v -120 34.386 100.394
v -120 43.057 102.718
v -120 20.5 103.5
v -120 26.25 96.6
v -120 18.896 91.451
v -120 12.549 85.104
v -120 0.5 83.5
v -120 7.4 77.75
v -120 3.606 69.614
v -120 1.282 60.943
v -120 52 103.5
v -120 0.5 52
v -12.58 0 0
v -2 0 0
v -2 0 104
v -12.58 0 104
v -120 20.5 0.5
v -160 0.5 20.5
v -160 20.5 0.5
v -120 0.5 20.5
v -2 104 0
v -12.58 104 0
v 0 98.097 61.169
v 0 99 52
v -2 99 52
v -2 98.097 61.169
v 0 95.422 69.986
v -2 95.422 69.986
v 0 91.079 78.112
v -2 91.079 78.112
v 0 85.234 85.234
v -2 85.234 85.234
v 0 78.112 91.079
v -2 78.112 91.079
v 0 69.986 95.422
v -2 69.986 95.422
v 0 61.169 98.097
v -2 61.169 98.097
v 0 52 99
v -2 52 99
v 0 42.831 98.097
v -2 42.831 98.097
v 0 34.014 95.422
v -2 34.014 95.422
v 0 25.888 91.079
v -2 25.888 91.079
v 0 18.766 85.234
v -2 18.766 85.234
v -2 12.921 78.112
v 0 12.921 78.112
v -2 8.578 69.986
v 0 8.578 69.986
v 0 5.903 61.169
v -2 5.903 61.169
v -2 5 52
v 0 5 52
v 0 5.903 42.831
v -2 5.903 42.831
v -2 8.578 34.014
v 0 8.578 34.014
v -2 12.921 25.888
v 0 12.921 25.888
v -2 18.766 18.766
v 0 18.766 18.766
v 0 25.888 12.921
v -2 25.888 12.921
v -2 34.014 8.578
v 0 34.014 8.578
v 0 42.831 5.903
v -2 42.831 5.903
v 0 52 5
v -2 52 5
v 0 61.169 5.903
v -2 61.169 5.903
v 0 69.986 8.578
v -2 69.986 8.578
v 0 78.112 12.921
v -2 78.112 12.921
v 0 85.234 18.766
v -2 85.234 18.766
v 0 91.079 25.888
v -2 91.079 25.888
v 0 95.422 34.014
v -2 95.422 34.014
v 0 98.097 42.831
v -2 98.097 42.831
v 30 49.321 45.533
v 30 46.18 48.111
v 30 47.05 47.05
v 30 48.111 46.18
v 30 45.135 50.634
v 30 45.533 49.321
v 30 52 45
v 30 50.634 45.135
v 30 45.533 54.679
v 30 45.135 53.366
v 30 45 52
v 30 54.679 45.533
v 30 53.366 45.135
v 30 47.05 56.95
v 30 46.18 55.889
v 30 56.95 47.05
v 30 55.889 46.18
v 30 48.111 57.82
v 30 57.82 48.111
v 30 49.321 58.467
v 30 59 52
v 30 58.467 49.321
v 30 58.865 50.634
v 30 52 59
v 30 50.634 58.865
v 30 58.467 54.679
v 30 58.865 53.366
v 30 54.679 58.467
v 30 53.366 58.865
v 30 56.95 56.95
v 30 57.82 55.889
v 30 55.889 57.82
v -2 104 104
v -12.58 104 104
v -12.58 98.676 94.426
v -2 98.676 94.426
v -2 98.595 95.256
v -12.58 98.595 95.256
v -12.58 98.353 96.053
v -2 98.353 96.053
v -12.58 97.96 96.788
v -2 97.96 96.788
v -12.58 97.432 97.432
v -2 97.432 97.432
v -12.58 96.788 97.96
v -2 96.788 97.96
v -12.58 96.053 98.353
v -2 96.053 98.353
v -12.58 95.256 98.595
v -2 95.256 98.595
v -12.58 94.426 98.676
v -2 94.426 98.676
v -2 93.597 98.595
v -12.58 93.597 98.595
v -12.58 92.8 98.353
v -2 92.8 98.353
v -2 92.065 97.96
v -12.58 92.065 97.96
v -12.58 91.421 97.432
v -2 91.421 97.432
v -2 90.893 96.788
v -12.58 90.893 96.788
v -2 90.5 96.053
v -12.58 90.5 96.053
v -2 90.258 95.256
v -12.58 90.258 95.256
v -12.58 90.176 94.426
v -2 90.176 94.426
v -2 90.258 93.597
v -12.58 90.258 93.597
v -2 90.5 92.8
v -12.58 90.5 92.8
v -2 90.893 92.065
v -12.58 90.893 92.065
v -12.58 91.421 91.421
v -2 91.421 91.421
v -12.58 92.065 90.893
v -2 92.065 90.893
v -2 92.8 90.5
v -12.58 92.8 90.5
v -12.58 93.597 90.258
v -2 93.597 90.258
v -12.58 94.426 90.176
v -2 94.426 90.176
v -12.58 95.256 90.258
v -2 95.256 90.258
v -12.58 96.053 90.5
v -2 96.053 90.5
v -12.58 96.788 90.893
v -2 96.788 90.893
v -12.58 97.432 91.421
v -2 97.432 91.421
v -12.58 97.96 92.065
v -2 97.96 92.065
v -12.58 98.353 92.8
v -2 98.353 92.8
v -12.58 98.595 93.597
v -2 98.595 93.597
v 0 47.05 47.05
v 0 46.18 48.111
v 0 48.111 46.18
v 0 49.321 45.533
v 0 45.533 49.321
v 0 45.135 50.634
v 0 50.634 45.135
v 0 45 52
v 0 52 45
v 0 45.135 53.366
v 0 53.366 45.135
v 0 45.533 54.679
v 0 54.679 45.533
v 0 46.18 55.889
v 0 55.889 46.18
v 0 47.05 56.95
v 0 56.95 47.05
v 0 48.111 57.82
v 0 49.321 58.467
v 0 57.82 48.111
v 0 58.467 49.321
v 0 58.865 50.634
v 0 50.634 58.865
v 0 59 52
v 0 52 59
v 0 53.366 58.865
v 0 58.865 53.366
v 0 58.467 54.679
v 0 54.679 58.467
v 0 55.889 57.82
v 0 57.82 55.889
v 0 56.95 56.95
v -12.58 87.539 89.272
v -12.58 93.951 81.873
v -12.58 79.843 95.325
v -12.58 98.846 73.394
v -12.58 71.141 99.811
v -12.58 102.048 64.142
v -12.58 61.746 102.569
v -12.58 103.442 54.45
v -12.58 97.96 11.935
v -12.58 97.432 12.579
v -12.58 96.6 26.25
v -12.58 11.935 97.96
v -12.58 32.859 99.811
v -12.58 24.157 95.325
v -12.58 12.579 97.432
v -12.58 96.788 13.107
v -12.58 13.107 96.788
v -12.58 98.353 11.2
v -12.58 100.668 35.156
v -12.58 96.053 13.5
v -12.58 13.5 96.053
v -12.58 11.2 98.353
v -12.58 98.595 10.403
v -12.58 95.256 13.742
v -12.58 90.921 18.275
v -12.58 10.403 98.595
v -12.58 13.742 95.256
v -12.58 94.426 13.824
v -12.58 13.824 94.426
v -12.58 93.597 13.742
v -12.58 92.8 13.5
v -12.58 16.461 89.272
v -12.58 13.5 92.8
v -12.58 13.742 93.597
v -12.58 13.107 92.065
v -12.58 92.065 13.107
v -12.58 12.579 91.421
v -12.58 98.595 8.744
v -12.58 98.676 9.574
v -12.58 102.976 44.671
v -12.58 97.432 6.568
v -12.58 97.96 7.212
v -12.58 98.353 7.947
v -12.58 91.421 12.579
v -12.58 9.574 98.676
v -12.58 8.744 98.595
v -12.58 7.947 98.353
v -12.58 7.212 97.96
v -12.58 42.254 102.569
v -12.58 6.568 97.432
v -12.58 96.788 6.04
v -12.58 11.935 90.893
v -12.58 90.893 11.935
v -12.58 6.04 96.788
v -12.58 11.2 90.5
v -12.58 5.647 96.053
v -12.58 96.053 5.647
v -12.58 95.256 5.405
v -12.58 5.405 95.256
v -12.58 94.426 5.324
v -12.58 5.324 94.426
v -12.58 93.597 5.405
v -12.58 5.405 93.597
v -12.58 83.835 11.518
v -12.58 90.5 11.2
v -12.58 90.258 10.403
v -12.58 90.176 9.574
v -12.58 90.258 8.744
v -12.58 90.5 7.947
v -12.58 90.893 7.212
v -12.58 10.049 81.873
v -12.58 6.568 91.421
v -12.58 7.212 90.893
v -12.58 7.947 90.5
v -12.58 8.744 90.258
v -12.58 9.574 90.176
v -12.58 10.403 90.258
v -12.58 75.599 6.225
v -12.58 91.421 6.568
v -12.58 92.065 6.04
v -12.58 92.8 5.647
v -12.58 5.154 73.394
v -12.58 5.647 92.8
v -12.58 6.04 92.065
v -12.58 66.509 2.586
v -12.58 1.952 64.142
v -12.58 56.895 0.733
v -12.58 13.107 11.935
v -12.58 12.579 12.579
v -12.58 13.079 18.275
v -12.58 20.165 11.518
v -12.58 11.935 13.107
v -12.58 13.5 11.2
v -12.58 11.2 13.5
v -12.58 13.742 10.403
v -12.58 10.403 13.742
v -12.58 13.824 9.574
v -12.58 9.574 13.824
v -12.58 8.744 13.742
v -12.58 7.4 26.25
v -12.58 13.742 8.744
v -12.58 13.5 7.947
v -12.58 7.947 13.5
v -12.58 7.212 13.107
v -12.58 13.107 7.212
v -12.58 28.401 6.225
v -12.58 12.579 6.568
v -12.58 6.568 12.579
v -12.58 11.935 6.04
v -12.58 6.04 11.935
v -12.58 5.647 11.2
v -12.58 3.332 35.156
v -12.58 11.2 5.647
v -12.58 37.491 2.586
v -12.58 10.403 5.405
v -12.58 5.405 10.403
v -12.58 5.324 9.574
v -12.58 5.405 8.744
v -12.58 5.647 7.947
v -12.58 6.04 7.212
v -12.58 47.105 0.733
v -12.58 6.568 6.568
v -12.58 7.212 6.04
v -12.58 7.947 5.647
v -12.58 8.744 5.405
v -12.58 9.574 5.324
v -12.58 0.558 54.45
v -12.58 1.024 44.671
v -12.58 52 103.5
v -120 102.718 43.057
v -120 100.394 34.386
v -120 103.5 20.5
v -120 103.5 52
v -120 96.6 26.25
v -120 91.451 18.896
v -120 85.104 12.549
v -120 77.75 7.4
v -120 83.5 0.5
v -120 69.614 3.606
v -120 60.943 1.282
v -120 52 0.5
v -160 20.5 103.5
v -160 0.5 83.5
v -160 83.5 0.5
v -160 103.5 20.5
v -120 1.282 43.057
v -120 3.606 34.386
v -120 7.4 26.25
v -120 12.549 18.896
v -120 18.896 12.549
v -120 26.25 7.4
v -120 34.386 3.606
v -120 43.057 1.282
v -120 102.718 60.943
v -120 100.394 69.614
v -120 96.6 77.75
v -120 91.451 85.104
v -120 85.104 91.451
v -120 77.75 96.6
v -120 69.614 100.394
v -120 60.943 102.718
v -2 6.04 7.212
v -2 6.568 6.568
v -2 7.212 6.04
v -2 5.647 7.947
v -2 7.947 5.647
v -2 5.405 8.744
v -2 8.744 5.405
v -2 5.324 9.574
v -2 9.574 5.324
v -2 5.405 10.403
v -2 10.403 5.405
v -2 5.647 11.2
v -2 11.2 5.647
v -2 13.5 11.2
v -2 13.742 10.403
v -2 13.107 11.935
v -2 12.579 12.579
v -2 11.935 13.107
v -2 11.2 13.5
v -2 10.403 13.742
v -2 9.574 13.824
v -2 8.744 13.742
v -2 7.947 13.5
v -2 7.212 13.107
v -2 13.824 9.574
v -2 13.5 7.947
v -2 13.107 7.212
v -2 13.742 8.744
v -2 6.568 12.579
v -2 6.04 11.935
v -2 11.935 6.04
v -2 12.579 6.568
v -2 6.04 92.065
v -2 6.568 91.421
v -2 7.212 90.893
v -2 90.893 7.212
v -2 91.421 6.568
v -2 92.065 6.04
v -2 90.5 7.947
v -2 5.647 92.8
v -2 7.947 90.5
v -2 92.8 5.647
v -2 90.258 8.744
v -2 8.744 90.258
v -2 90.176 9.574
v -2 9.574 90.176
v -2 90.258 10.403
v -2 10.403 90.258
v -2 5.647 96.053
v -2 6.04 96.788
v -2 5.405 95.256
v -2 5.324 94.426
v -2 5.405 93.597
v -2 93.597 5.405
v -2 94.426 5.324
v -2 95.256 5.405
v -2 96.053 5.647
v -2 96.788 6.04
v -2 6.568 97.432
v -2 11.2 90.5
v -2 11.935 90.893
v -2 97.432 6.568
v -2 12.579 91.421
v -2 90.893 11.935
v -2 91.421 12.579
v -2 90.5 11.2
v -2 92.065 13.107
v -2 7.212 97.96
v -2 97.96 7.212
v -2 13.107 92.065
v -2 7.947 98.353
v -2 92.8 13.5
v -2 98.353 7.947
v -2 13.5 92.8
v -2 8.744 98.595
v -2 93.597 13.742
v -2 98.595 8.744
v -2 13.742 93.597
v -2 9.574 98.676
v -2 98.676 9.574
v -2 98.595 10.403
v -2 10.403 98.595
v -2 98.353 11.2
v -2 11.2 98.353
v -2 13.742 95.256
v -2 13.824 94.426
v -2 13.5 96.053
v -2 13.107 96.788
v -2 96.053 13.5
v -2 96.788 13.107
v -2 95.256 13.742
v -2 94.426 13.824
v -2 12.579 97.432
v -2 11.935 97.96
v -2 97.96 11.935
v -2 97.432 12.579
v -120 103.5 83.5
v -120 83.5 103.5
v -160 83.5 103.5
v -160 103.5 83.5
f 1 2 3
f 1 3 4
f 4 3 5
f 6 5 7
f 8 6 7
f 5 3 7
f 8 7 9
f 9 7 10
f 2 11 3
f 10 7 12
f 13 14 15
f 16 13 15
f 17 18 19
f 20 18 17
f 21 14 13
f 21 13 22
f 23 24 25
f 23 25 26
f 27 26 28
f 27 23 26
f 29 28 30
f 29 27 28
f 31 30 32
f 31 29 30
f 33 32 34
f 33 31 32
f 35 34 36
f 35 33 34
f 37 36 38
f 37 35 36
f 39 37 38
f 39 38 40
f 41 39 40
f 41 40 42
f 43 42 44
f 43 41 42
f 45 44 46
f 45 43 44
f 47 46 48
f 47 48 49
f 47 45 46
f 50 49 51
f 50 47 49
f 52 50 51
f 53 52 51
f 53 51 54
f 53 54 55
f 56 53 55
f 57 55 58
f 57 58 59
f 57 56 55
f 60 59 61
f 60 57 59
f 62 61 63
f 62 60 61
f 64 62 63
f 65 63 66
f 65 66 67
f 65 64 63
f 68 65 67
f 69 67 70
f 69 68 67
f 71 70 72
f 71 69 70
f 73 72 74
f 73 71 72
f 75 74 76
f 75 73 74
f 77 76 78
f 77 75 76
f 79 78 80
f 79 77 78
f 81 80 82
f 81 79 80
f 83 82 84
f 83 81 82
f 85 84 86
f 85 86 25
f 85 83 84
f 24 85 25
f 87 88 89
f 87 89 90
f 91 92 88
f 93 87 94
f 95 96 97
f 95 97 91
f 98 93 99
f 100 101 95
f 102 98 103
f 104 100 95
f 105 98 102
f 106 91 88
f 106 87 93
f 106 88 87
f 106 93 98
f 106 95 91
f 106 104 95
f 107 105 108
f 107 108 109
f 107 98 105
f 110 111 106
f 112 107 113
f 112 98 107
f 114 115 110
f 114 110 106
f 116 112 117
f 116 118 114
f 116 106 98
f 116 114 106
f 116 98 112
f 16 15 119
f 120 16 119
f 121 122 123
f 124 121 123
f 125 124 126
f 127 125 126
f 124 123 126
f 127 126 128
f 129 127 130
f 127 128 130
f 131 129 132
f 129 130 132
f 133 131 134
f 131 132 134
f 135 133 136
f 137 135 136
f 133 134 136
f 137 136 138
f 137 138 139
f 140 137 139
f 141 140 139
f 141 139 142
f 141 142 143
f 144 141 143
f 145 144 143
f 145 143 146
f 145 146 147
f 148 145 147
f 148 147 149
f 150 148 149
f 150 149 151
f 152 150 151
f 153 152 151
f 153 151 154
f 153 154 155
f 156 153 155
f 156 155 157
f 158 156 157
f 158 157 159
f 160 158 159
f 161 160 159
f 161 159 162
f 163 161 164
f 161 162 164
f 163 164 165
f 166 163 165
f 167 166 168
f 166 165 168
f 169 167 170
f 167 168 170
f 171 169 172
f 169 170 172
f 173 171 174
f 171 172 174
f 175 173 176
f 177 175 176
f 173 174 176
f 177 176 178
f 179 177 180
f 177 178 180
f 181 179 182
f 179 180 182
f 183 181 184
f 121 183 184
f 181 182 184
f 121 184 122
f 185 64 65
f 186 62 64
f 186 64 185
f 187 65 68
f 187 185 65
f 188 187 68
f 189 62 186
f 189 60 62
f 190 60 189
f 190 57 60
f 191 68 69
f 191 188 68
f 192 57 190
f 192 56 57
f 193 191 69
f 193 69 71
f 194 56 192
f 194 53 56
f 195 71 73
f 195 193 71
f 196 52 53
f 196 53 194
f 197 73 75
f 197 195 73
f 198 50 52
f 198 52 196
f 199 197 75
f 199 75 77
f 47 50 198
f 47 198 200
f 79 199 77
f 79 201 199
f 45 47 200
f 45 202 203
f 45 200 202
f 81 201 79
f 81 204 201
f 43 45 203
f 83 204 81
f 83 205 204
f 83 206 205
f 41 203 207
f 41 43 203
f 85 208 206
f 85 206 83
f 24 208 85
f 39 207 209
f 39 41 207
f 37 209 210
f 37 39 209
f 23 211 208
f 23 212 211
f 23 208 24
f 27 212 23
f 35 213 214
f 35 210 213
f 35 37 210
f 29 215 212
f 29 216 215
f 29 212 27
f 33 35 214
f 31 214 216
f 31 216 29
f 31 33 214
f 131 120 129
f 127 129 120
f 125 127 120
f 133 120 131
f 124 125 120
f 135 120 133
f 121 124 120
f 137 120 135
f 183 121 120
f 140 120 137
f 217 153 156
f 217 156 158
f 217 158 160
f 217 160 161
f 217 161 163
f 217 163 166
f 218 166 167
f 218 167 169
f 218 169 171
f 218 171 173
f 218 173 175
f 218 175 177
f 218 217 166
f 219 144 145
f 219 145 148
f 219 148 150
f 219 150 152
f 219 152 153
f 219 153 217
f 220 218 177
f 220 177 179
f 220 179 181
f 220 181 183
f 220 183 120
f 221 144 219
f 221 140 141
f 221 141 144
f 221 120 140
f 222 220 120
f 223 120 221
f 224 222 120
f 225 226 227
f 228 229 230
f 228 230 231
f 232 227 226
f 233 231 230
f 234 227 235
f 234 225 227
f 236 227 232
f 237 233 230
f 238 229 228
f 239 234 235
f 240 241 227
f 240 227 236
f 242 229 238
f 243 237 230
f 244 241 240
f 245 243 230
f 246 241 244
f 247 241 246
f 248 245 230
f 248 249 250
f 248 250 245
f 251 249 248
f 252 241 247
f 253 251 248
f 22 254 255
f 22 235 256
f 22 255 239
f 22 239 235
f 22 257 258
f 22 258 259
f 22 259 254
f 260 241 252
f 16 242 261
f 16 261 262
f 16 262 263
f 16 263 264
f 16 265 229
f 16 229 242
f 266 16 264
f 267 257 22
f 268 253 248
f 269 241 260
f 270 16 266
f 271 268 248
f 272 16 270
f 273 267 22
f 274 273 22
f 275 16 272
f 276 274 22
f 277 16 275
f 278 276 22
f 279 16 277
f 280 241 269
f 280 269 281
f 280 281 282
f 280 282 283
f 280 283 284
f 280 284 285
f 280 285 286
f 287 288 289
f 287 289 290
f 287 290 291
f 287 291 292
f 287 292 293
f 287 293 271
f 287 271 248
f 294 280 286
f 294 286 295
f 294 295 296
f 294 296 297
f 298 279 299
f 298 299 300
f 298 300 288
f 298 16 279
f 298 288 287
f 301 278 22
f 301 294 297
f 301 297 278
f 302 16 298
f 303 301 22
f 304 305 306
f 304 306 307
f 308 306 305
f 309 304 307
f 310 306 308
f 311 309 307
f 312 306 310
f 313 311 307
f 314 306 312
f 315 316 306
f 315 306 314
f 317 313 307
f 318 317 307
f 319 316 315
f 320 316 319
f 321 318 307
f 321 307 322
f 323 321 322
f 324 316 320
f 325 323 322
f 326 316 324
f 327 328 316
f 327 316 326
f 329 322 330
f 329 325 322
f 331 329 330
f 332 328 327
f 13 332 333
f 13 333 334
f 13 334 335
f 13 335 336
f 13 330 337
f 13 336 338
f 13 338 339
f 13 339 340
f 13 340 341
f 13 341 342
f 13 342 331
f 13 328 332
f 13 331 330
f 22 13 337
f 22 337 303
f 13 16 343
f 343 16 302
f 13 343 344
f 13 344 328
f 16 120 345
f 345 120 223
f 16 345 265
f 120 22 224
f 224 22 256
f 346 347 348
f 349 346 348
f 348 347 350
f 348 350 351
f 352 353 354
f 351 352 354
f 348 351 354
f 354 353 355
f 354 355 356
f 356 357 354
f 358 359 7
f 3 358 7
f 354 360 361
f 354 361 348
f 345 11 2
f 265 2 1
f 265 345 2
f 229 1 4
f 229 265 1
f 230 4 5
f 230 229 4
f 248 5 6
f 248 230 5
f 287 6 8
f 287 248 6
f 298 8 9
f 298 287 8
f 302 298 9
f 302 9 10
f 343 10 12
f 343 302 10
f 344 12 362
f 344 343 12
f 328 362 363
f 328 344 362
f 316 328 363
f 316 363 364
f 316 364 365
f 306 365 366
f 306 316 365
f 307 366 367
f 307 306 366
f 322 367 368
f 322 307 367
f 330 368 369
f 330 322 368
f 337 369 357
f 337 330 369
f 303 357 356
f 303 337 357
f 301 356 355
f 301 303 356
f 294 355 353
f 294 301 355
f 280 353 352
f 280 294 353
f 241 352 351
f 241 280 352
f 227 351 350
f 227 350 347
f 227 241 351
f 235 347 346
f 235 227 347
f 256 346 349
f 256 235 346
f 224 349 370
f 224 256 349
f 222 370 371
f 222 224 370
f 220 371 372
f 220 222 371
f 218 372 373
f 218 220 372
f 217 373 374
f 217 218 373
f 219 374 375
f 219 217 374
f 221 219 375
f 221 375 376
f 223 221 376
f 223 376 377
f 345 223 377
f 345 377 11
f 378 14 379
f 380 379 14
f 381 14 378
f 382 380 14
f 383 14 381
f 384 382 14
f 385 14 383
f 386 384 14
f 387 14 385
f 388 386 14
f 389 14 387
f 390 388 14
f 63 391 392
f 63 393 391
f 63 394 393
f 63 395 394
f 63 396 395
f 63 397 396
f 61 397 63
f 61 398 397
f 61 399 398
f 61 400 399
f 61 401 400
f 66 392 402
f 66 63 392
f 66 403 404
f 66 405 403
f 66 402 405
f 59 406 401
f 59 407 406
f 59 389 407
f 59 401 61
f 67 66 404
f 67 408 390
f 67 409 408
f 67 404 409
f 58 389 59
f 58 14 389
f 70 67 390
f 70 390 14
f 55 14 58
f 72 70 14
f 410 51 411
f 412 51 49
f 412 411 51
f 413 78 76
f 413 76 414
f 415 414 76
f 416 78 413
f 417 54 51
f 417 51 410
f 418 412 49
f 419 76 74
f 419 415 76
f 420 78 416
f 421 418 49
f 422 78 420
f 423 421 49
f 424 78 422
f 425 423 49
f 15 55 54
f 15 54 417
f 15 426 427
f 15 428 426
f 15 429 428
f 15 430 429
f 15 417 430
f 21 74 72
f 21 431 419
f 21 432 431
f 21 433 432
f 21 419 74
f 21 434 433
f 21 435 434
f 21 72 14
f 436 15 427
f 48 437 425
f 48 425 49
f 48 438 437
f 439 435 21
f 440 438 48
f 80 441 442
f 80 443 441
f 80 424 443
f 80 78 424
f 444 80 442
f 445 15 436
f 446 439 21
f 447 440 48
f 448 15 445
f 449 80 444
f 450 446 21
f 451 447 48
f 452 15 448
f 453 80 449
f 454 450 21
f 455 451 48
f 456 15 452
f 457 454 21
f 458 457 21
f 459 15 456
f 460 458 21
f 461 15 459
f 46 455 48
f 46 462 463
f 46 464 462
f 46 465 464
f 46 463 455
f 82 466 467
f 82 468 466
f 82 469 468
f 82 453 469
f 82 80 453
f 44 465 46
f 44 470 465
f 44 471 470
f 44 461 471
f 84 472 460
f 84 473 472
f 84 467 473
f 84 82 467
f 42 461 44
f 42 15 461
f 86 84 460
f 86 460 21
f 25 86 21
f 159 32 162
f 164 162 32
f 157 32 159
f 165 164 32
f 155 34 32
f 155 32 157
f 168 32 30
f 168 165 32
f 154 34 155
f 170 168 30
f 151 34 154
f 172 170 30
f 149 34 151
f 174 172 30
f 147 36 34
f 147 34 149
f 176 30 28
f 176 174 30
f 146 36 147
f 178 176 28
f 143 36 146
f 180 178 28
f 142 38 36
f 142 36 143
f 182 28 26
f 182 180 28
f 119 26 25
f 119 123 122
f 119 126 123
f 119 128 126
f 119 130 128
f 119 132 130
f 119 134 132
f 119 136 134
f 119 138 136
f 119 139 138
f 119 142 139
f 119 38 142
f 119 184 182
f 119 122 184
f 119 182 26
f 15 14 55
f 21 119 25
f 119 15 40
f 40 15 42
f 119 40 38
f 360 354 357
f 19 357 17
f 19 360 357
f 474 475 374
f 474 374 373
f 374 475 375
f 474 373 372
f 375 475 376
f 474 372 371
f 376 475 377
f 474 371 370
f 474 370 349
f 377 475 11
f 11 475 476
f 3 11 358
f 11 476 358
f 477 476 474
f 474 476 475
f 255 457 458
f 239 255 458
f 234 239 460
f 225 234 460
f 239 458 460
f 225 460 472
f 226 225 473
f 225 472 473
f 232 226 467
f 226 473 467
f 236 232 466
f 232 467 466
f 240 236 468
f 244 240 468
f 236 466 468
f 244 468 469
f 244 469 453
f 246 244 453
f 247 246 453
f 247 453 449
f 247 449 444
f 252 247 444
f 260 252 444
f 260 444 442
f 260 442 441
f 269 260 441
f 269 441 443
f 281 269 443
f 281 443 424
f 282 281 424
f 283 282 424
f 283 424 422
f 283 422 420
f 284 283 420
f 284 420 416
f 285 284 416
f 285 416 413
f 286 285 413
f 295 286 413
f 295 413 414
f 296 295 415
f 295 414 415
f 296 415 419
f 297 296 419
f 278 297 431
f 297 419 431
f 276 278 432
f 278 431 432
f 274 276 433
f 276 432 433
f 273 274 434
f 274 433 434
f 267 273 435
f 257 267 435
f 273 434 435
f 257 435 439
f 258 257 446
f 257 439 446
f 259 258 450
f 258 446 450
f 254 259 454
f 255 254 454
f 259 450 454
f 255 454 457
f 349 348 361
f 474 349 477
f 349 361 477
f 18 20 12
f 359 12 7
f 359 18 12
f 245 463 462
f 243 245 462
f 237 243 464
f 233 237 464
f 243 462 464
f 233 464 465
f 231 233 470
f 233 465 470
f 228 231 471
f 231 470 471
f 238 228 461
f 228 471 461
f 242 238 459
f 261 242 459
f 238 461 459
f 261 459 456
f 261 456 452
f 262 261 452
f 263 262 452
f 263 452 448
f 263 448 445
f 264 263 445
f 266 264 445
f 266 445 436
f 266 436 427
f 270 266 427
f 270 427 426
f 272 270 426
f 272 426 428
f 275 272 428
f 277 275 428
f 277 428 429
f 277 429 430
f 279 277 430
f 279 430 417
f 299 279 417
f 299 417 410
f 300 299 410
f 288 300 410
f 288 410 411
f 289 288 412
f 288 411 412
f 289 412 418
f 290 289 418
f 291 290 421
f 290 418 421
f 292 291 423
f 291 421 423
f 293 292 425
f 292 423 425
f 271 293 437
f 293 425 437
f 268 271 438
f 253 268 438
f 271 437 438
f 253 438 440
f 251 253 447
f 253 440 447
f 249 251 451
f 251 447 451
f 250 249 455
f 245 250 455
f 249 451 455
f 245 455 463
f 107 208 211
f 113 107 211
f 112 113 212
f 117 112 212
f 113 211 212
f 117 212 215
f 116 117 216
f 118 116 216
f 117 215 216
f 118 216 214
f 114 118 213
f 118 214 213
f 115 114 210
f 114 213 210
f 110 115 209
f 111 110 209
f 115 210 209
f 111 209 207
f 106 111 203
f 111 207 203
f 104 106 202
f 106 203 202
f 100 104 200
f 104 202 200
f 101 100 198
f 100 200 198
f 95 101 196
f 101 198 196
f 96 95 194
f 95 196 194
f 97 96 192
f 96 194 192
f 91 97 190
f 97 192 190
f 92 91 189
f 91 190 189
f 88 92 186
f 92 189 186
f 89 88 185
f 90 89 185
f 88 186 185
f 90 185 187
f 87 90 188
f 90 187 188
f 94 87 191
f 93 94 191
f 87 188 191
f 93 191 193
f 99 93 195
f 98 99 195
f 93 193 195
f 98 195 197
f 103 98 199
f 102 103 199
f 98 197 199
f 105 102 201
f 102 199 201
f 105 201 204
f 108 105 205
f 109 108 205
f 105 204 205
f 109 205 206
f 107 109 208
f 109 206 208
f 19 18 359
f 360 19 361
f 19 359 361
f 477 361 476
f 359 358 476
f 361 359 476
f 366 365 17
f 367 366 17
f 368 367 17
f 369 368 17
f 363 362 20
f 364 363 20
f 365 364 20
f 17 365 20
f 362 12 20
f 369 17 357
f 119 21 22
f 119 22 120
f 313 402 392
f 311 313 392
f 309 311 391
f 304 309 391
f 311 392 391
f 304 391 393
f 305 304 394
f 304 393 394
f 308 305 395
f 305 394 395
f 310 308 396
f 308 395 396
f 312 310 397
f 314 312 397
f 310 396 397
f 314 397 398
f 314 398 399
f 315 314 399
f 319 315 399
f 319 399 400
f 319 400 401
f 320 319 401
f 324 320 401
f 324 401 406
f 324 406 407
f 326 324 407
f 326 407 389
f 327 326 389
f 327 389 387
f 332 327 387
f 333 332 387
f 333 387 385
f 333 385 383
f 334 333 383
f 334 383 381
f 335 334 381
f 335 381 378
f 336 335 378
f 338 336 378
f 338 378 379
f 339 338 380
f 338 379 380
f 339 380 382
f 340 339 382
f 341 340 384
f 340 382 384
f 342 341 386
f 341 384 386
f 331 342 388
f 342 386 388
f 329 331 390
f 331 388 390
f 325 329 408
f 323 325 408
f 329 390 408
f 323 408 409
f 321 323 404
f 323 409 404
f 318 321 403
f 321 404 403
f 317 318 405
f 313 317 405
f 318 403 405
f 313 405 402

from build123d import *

# Parameters (mm, degrees)
F0_W      = 104
F0_H      = 104
F1_DEPTH  = 160
F3_W      = 107.42
F3_H      = 40
F5_W      = 104
F5_H      = 104
F5_W_2    = 103
F5_H_2    = 103
F6_DEPTH  = 40
F7_SIZE   = 20
F8_R      = 4.25
F9_DEPTH  = 25
F10_R     = 7
F11_DEPTH = 30
F12_W     = 104
F12_H     = 104
F12_R     = 4.25
F12_R_2   = 47
F13_DEPTH = 2


with BuildPart() as f1:
    # F0 (on Right) → F1 (new body)
    with BuildSketch(Plane.YZ):
        with Locations((52, 52)):
            Rectangle(F0_W, F0_H)
    extrude(amount=-F1_DEPTH)

    # F3 (on offset) → F4 (revolve, cut)
    with BuildSketch(Plane.XZ.offset(-52)):
        with Locations((-66.29, 123.5)):
            Rectangle(F3_W, F3_H)
    revolve(axis=Axis((-69.2846309394, 52, 52), (1, 0, 0)), mode=Mode.SUBTRACT)

    # F5 (on face) → F6 (cut)
    with BuildSketch(Plane(origin=(-160, 0, 0), x_dir=(0, -1, 0), z_dir=(-1, 0, 0))):
        with Locations((-52, 52)):
            Rectangle(F5_W, F5_H)
        with Locations((-52, 52)):
            Rectangle(F5_W_2, F5_H_2, mode=Mode.SUBTRACT)
    extrude(amount=-F6_DEPTH, mode=Mode.SUBTRACT)

    # F7
    f7_edges = [f1.edges().sort_by_distance(p)[0] for p in [
        (-140, 0.5, 103.5),
        (-140, 103.5, 103.5),
        (-140, 103.5, 0.5),
        (-140, 0.5, 0.5),
    ]]
    chamfer(f7_edges, length=F7_SIZE)

    # F8 (on face) → F9 (cut)
    with BuildSketch(Plane.YZ):
        with Locations((94.4264068712, 94.4264068712)):
            Circle(F8_R)
        with Locations((94.4264068712, 9.5735931288)):
            Circle(F8_R)
        with Locations((9.5735931288, 94.4264068712)):
            Circle(F8_R)
        with Locations((9.5735931288, 9.5735931288)):
            Circle(F8_R)
    extrude(amount=-F9_DEPTH, mode=Mode.SUBTRACT)

    # F10 (on face) → F11 (join)
    with BuildSketch(Plane.YZ):
        with Locations((52, 52)):
            Circle(F10_R)
    extrude(amount=F11_DEPTH)

    # F12 (on face) → F13 (cut)
    with BuildSketch(Plane.YZ):
        with Locations((52, 52)):
            Rectangle(F12_W, F12_H)
        with Locations((9.5735931288, 9.5735931288)):
            Circle(F12_R, mode=Mode.SUBTRACT)
        with Locations((94.4264068712, 9.5735931288)):
            Circle(F12_R, mode=Mode.SUBTRACT)
        with Locations((9.5735931288, 94.4264068712)):
            Circle(F12_R, mode=Mode.SUBTRACT)
        with Locations((52, 52)):
            Circle(F12_R_2, mode=Mode.SUBTRACT)
        with Locations((94.4264068712, 94.4264068712)):
            Circle(F12_R, mode=Mode.SUBTRACT)
    extrude(amount=-F13_DEPTH, mode=Mode.SUBTRACT)


solid = f1.part
